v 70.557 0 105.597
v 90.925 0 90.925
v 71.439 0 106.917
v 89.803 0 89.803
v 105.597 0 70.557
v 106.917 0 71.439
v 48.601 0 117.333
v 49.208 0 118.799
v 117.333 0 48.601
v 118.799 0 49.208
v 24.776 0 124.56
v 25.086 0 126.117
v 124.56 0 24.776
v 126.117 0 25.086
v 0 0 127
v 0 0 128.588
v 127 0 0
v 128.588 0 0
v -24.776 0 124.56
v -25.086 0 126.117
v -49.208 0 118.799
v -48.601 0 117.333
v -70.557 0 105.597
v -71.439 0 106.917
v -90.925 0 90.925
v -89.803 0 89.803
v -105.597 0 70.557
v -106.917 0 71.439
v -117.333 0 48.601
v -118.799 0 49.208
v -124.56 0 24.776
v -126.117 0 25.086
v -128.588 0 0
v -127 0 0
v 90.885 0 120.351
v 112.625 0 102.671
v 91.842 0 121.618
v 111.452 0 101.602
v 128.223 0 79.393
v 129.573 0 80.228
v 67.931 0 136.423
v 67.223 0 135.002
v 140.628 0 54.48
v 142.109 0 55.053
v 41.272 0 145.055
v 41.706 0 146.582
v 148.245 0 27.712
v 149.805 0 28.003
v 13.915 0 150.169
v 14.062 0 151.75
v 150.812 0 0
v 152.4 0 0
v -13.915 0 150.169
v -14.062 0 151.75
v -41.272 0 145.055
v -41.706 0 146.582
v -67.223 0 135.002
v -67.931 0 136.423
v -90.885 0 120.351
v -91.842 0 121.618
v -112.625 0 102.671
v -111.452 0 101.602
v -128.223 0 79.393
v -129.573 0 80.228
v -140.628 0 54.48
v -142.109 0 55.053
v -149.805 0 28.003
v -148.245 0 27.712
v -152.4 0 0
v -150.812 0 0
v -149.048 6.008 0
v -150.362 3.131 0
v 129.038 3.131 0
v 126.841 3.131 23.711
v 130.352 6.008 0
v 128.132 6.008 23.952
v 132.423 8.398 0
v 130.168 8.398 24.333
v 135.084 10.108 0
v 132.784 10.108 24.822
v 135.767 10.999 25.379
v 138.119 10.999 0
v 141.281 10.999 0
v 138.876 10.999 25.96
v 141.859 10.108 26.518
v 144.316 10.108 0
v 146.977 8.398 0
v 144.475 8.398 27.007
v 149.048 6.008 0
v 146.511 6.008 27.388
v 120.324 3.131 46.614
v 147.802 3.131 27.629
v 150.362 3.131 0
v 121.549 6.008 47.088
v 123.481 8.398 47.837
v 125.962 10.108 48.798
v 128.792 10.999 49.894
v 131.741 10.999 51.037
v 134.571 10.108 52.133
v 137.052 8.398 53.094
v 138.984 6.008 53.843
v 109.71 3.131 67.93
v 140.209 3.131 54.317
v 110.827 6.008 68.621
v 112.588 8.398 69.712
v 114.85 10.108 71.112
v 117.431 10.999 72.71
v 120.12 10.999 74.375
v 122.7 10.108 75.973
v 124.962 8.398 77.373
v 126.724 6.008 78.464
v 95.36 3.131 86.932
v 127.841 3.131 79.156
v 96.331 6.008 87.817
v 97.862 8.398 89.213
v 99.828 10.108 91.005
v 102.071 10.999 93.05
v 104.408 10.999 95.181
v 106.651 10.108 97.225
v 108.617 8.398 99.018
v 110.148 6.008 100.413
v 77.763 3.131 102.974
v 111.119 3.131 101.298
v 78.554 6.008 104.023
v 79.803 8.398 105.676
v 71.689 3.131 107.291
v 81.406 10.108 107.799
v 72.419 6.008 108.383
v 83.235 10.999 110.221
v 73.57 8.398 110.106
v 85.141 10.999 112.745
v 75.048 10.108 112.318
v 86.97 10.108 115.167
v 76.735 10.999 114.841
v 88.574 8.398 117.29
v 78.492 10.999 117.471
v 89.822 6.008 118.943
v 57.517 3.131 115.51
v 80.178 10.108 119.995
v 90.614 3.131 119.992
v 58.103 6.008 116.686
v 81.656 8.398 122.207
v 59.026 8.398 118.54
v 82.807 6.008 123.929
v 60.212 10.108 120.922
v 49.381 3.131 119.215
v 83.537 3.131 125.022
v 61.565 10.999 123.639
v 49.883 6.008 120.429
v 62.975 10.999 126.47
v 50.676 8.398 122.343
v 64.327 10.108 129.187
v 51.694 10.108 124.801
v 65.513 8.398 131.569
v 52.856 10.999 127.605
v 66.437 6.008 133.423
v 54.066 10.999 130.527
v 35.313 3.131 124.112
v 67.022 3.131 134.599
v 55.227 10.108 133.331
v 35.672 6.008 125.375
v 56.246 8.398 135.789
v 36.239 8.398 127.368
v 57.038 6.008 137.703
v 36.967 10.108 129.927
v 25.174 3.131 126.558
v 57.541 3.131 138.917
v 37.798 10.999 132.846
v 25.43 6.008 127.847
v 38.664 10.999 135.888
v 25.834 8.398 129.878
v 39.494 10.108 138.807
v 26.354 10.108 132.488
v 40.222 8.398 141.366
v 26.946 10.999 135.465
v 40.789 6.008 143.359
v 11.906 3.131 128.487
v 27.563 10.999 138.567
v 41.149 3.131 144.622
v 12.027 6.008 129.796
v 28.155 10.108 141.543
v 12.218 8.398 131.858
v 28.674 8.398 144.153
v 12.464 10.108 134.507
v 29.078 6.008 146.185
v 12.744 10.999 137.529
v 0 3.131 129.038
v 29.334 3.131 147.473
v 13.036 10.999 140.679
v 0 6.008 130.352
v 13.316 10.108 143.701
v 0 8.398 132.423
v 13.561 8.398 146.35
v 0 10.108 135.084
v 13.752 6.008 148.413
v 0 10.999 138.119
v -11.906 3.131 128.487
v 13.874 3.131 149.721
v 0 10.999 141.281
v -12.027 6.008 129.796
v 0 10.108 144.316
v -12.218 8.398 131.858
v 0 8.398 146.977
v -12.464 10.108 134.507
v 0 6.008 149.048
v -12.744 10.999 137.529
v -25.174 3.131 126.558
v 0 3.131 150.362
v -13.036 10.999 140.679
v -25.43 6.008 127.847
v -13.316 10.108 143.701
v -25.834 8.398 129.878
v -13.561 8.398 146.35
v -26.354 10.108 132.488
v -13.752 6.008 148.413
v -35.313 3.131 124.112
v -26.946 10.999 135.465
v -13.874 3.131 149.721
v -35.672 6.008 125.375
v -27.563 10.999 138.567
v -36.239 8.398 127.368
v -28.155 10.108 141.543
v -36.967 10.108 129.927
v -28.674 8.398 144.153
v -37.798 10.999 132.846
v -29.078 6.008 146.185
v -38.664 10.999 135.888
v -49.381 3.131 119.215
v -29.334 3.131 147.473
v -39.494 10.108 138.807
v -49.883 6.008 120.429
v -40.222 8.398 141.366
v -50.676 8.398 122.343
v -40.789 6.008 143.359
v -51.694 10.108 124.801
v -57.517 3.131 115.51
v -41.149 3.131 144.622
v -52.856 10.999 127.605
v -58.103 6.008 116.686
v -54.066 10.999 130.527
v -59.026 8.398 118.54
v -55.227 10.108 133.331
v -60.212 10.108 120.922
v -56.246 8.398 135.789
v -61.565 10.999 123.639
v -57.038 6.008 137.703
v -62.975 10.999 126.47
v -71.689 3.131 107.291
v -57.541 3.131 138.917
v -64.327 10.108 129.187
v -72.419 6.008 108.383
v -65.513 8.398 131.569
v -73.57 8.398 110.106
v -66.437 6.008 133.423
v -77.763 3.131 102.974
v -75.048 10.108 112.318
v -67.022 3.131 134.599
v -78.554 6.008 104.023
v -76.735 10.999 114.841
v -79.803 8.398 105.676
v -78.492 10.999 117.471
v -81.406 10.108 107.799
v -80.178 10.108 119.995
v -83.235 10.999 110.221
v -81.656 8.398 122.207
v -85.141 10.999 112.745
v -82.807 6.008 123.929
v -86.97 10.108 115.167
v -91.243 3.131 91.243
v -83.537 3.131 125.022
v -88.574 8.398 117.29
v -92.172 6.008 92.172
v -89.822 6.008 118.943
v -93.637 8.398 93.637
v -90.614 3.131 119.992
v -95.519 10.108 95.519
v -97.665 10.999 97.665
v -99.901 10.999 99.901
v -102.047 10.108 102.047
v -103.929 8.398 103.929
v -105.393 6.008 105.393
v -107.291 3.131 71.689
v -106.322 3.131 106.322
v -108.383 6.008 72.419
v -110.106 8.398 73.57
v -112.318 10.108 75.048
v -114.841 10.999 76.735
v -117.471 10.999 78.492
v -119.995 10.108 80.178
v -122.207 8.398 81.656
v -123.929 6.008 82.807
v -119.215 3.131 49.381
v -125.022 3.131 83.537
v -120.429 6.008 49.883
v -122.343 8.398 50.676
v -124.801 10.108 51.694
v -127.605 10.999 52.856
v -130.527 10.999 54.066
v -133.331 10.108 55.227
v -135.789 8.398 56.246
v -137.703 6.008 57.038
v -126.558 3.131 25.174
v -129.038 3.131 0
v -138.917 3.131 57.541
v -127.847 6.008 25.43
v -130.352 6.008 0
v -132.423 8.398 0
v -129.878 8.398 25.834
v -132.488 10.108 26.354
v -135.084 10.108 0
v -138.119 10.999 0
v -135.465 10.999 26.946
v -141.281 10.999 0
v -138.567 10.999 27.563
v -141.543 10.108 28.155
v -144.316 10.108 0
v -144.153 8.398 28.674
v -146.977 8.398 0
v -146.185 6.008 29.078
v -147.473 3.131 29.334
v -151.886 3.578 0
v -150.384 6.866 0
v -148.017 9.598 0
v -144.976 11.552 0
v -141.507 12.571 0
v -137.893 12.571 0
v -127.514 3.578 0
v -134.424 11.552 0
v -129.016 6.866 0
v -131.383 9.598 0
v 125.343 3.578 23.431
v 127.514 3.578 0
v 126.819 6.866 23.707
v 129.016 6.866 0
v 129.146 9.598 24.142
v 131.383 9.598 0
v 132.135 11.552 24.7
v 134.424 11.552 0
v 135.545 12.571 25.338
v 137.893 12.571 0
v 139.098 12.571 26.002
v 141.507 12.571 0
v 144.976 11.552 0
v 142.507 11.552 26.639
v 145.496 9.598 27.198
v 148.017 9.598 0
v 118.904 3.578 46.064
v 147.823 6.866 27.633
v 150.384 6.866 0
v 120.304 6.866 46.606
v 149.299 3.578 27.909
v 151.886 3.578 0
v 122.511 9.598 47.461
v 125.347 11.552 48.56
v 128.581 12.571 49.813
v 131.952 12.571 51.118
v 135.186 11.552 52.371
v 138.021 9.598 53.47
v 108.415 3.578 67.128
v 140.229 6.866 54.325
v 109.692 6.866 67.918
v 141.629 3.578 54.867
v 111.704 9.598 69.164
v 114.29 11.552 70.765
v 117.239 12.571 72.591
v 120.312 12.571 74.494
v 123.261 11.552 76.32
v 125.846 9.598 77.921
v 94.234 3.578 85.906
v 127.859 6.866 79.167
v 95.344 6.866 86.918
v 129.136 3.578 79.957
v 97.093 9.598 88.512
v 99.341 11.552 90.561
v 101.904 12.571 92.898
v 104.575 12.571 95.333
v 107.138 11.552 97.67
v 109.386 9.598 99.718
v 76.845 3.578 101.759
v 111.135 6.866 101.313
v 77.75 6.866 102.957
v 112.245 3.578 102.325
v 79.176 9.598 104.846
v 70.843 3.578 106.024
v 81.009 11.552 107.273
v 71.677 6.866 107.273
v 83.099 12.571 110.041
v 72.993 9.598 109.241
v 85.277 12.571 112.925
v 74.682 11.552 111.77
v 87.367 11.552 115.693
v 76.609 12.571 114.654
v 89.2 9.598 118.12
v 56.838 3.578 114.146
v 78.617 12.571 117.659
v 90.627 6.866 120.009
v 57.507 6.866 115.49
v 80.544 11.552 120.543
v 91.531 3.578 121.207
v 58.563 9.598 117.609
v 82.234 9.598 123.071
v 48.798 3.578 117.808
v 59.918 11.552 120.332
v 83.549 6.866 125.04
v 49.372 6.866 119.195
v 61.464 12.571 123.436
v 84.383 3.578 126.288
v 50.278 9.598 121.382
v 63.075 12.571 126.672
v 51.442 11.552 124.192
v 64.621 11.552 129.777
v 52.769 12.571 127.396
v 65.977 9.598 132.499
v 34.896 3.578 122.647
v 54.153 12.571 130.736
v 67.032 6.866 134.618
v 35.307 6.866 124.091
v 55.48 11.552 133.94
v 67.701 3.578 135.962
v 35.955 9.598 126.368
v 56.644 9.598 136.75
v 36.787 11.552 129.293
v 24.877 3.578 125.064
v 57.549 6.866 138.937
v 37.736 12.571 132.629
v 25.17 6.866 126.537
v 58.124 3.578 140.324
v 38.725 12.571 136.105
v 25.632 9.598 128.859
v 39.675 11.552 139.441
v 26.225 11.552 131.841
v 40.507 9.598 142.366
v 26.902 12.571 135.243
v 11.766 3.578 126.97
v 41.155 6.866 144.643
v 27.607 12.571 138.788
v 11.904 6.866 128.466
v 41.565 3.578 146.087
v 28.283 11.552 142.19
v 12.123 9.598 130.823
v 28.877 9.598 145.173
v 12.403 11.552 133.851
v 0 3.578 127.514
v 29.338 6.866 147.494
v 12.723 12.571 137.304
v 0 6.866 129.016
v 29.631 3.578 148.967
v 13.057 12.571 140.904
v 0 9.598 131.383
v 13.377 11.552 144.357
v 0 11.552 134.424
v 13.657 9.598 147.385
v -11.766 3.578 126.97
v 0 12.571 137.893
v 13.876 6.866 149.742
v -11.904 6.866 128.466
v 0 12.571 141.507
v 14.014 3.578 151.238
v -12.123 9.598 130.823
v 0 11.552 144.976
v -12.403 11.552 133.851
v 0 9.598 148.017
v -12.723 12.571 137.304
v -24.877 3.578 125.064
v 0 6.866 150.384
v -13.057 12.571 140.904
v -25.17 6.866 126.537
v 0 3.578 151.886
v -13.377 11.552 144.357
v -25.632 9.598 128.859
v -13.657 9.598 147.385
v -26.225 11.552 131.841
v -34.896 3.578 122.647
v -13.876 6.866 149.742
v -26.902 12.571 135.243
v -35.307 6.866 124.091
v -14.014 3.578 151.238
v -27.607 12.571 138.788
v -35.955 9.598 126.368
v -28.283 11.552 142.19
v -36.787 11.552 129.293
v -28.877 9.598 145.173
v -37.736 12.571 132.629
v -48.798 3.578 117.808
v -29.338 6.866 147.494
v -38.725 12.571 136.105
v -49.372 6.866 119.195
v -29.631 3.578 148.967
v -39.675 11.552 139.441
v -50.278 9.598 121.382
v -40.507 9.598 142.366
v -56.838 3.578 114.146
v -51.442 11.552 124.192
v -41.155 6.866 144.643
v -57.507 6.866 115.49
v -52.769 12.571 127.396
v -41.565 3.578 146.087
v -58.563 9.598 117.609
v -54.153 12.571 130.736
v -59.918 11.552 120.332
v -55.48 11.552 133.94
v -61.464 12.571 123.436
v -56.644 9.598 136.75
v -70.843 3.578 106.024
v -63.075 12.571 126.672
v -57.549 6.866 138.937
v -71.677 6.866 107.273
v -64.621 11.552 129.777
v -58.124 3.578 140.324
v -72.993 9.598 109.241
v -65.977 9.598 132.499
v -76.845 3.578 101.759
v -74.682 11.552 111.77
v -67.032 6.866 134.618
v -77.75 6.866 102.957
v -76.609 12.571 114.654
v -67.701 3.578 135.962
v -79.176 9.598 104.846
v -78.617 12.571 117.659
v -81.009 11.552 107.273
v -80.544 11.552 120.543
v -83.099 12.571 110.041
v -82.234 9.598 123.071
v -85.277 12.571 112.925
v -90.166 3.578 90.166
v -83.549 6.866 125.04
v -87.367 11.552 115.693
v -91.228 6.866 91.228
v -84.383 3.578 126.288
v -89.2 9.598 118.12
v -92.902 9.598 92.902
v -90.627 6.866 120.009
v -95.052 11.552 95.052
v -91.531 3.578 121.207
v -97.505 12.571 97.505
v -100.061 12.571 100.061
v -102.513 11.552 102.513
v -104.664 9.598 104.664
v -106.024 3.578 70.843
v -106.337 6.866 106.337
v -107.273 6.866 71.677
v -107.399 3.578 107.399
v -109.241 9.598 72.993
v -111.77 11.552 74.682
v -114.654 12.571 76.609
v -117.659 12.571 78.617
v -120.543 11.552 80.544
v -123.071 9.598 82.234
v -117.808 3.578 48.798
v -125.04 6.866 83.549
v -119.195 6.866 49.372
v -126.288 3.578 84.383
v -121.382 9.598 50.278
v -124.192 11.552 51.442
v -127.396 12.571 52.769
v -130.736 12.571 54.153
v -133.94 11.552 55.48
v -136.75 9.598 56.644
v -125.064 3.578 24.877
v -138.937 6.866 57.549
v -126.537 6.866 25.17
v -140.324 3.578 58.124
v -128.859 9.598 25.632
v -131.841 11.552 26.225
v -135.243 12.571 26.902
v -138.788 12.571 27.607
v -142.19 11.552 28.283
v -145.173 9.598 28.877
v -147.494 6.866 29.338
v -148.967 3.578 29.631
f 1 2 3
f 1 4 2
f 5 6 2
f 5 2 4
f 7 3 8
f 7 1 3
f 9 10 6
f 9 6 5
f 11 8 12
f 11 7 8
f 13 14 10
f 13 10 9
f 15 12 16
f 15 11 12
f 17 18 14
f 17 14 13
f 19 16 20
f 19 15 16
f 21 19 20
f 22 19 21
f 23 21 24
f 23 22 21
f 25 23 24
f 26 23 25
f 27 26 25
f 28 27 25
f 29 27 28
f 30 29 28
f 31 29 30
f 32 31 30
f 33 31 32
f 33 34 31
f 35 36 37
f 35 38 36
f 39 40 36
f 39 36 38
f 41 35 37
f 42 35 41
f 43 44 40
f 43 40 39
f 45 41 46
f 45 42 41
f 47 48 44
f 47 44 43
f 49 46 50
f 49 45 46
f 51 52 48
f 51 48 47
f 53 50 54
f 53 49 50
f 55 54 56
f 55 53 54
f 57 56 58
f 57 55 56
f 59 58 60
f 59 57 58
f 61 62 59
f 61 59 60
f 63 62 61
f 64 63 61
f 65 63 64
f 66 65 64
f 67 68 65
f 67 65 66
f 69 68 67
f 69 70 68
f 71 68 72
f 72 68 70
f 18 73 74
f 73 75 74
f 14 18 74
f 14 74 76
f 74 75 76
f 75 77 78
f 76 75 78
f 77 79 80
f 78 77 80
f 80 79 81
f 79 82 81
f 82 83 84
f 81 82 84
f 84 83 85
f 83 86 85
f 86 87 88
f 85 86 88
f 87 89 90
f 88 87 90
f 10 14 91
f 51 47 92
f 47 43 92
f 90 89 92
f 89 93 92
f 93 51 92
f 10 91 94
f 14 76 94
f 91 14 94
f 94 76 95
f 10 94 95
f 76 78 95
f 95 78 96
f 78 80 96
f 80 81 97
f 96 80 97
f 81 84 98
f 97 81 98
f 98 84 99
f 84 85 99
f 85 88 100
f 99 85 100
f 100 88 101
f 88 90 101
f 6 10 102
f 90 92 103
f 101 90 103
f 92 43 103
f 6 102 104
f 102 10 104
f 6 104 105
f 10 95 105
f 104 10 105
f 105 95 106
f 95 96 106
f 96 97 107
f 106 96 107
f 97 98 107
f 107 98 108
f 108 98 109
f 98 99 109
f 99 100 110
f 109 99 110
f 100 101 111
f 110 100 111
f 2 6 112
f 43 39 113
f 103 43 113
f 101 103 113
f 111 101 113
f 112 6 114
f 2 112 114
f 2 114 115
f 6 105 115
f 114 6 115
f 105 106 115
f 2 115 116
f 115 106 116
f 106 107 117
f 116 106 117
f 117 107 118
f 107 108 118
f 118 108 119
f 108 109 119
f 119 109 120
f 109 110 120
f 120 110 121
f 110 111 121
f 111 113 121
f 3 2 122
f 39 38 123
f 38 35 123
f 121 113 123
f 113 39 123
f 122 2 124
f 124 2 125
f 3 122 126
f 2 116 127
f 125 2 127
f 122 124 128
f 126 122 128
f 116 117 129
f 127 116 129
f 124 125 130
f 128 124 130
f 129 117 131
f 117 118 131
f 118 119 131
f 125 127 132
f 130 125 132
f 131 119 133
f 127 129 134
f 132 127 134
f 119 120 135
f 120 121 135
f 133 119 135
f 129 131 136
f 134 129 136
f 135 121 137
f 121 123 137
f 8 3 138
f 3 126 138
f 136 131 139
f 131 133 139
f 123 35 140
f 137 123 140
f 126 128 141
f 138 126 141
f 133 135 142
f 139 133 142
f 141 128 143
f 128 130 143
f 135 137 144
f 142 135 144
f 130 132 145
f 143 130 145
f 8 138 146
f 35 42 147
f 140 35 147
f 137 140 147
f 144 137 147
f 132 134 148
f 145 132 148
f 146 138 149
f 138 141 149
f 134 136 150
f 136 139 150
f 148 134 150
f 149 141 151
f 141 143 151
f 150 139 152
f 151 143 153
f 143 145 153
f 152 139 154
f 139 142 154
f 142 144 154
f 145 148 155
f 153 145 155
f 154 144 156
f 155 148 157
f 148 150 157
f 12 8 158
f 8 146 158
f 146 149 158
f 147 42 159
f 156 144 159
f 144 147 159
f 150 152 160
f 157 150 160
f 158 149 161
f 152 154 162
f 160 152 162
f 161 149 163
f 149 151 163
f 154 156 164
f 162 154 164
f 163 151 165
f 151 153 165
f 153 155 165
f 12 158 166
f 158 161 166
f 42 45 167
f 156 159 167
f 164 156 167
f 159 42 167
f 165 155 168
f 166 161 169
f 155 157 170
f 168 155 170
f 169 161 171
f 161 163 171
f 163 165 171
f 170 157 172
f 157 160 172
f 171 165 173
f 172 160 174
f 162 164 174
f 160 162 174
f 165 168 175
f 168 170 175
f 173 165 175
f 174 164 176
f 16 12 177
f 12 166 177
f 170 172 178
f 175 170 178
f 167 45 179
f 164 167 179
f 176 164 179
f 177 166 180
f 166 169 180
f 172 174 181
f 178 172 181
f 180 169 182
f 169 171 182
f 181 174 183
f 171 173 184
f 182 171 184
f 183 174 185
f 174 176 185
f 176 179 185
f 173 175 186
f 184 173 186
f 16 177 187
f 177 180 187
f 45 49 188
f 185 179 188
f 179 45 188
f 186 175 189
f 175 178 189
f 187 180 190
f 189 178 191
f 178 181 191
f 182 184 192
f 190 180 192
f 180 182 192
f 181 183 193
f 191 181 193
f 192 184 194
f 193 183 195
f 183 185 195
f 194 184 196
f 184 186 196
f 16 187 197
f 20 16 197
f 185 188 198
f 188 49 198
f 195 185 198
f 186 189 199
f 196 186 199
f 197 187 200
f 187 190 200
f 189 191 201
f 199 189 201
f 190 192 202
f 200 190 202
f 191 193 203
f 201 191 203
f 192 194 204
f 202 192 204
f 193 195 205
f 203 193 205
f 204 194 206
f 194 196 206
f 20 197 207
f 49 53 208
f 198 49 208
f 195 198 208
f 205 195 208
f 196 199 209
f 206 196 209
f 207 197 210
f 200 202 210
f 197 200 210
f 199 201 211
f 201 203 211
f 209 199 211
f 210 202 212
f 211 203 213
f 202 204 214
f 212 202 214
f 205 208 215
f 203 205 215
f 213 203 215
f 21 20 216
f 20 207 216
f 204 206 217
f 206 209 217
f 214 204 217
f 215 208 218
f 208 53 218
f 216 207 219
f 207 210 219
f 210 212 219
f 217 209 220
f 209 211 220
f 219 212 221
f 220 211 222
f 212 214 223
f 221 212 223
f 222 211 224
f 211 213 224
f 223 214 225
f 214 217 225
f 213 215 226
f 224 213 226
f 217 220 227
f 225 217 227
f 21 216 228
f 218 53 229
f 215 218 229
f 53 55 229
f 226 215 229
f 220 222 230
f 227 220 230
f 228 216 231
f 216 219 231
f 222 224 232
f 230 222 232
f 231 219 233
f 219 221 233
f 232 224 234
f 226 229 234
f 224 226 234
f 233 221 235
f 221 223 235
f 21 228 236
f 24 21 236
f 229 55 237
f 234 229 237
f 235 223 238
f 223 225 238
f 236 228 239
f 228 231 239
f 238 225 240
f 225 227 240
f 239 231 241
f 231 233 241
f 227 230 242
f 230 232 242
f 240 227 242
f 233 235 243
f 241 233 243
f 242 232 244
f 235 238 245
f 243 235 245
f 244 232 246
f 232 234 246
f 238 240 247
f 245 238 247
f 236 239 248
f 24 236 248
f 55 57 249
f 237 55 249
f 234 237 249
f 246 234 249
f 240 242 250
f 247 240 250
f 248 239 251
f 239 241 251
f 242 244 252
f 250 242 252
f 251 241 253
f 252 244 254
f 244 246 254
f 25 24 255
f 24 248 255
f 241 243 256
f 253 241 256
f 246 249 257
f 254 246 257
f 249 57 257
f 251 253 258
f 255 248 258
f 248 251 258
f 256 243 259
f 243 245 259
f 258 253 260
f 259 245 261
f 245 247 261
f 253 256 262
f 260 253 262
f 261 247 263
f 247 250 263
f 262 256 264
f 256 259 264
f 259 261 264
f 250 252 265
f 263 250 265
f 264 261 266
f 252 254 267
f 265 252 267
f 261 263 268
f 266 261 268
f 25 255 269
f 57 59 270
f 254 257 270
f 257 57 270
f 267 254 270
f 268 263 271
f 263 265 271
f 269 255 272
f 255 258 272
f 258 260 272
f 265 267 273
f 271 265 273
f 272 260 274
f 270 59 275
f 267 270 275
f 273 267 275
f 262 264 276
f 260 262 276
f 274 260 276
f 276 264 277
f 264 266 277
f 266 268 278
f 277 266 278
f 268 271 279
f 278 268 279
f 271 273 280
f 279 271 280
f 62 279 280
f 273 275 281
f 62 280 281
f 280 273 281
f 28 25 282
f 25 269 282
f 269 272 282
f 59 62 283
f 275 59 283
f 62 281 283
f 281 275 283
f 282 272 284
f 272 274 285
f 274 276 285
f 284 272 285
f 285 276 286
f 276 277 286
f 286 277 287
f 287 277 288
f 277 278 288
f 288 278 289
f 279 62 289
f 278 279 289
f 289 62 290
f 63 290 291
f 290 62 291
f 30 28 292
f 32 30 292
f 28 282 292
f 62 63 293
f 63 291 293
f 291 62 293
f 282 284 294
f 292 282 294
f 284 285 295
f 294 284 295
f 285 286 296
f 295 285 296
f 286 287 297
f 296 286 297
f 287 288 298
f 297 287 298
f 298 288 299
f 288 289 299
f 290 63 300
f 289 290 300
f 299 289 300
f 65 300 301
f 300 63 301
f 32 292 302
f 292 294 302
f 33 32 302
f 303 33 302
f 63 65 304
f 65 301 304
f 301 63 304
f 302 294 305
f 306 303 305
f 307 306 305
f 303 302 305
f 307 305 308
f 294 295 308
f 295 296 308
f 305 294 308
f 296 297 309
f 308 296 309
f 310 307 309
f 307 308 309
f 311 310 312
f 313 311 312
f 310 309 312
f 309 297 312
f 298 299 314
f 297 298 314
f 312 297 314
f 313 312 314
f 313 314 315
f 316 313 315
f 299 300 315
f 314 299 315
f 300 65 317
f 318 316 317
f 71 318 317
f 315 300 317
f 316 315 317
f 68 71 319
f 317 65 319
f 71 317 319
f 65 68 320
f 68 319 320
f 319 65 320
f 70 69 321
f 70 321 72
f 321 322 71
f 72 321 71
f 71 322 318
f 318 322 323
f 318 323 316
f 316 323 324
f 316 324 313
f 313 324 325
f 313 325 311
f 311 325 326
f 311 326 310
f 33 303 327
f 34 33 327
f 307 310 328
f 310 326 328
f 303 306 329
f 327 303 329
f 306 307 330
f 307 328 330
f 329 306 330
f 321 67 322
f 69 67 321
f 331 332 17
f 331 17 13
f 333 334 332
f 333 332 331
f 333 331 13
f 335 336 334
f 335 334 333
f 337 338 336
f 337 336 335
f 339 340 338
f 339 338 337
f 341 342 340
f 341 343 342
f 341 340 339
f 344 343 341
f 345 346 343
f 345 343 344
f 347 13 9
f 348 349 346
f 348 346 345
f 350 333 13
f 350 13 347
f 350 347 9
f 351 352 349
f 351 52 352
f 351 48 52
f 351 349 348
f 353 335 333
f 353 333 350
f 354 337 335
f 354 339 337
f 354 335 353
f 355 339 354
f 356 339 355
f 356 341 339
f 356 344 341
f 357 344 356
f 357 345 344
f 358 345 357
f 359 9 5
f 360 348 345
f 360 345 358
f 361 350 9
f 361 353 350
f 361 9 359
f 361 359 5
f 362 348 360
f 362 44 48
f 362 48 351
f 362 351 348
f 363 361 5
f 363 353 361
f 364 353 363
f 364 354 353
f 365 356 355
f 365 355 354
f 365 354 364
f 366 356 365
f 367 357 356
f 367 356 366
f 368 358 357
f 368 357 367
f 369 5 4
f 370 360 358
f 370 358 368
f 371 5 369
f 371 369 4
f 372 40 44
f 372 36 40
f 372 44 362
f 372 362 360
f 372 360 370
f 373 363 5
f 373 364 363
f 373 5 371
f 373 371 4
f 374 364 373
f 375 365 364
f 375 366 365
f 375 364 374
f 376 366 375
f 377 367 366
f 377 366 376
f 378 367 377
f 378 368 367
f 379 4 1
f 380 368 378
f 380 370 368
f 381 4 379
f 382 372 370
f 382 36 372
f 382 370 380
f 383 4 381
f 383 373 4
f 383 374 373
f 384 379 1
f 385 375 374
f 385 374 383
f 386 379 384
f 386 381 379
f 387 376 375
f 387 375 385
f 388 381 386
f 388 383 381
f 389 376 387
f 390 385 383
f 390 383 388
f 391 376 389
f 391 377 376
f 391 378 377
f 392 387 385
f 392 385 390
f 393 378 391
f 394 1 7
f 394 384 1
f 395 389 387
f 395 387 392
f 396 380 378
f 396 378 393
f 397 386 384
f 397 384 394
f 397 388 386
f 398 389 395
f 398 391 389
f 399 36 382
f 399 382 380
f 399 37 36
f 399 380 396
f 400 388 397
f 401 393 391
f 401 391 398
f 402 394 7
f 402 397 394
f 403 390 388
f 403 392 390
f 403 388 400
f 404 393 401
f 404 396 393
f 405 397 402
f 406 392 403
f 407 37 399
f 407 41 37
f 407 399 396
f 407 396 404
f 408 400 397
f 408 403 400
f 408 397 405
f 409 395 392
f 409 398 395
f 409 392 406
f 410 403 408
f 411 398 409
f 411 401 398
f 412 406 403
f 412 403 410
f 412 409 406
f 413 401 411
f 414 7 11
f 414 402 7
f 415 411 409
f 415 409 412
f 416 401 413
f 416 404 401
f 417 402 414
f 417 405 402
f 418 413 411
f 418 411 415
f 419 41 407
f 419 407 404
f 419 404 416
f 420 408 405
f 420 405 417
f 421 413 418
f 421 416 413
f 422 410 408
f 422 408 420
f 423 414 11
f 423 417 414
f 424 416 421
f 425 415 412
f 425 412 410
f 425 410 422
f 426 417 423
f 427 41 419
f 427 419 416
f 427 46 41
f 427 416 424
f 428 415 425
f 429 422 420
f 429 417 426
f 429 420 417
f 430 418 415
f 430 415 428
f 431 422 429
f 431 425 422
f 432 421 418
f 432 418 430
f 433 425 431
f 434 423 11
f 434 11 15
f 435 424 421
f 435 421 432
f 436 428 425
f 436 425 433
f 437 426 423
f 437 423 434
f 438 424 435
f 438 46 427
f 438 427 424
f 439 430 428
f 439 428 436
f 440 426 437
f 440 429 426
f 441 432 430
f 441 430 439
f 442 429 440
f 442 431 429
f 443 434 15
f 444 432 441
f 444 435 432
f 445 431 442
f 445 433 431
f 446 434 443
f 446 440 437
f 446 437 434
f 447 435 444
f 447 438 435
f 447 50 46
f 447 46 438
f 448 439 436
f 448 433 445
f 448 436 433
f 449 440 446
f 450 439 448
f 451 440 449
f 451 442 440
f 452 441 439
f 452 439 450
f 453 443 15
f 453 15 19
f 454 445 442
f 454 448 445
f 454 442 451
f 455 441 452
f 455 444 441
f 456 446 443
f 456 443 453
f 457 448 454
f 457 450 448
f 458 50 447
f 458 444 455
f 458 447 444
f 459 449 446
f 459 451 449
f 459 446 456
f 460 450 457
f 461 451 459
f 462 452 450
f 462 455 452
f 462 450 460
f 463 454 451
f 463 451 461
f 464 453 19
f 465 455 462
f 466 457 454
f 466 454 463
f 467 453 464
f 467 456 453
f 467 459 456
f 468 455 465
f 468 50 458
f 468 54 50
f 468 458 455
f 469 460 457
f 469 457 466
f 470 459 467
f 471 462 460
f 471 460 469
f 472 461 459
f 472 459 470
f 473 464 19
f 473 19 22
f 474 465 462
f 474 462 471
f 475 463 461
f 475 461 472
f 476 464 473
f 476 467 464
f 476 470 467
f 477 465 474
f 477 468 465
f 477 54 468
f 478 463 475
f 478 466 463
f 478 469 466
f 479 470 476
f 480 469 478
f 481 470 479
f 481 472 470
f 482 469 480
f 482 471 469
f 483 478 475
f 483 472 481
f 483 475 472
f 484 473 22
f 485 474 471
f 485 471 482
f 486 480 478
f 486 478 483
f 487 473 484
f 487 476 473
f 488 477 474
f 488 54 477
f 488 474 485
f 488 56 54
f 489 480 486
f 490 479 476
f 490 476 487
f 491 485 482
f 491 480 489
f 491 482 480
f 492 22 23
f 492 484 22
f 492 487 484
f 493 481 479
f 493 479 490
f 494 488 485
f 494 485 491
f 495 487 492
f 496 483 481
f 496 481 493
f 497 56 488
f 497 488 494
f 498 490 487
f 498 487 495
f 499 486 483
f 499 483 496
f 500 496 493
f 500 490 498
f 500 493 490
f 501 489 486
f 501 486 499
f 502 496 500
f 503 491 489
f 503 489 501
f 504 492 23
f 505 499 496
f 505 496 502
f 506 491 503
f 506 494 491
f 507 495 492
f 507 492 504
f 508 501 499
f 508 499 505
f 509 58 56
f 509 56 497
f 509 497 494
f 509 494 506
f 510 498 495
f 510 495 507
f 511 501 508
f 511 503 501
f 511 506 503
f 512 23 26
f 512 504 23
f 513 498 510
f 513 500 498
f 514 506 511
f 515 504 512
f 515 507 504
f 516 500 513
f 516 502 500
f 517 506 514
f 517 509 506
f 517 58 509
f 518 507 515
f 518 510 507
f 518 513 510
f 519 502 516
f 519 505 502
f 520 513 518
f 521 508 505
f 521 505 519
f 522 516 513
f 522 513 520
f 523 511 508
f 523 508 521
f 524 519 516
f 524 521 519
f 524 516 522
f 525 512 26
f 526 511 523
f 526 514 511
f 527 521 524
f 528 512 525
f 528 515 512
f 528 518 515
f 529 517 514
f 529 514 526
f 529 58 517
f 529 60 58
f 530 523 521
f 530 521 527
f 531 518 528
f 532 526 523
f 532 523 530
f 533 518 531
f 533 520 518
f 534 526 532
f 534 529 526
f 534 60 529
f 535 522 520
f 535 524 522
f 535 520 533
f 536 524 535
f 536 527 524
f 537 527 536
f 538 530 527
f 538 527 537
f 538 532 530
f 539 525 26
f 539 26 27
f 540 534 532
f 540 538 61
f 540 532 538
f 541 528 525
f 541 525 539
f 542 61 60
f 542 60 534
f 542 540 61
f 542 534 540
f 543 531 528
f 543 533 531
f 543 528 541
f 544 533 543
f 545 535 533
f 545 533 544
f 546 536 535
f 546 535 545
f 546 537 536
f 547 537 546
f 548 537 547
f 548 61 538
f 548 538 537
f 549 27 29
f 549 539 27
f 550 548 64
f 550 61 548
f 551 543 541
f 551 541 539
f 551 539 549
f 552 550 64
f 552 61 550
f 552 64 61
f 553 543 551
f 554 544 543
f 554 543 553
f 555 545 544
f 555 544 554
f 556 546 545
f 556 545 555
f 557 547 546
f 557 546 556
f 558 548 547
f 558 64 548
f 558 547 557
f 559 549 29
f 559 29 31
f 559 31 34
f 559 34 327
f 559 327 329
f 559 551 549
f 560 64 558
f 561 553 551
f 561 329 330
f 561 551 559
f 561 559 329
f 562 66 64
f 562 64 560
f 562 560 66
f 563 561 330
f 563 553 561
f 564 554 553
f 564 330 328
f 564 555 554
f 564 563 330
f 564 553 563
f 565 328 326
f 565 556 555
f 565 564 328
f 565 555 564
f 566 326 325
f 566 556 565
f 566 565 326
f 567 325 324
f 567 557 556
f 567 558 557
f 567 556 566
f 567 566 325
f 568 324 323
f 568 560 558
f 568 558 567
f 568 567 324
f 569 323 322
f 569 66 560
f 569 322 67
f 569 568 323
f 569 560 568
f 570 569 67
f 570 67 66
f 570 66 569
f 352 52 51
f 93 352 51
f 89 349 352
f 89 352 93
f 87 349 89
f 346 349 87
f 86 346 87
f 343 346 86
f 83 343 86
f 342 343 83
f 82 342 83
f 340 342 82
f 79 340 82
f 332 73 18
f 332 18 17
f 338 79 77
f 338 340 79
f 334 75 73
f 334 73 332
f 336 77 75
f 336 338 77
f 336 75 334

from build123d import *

# Parameters (mm, degrees)
F1_R = 12.7


with BuildPart() as f2:
    # F2: sweep along a path in F0
    with BuildLine(Plane.XZ) as f2_path:
        ThreePointArc((139.7, 0), (0, 139.7), (-139.7, 0))
    # F1 (on Top) → F2 (sweep)
    with BuildSketch(Plane.XY):
        with Locations((-139.7, 0)):
            Circle(F1_R)
    sweep(path=f2_path.line)

    # F4: sweep along a path in F0
    with BuildLine(Plane.XZ) as f4_path:
        ThreePointArc((139.7, 0), (0, 139.7), (-139.7, 0))
    # F3 (on face) → F4 (sweep, cut)
    with BuildSketch(Plane(origin=(0, 0, 0), x_dir=(1, 0, 0), z_dir=(0, 0, -1))):
        with BuildLine():
            ThreePointArc((-152.4, 0), (-139.7, 12.3904935703), (-127, 0))
            ThreePointArc((-127, 0), (-139.7, 12.7), (-152.4, 0))
        make_face()
        with BuildLine():
            Line((-152.4, 0), (-127, 0))
            ThreePointArc((-127, 0), (-139.7, 12.3904935703), (-152.4, 0))
        make_face()
    sweep(path=f4_path.line, mode=Mode.SUBTRACT)

    # F6: sweep along a path in F0
    with BuildLine(Plane.XZ) as f6_path:
        ThreePointArc((139.7, 0), (0, 139.7), (-139.7, 0))
    # F5 (on face) → F6 (sweep, cut)
    with BuildSketch(Plane(origin=(0, 0, 0), x_dir=(1, 0, 0), z_dir=(0, 0, -1))):
        with BuildLine():
            ThreePointArc((-128.5875, 0), (-139.7, 11.1125), (-150.8125, 0))
            Line((-150.8125, 0), (-128.5875, 0))
        make_face()
        with BuildLine():
            Line((-128.5875, 0), (-150.8125, 0))
            ThreePointArc((-150.8125, 0), (-139.7, -11.1125), (-128.5875, 0))
        make_face()
    sweep(path=f6_path.line, mode=Mode.SUBTRACT)


solid = f2.part
